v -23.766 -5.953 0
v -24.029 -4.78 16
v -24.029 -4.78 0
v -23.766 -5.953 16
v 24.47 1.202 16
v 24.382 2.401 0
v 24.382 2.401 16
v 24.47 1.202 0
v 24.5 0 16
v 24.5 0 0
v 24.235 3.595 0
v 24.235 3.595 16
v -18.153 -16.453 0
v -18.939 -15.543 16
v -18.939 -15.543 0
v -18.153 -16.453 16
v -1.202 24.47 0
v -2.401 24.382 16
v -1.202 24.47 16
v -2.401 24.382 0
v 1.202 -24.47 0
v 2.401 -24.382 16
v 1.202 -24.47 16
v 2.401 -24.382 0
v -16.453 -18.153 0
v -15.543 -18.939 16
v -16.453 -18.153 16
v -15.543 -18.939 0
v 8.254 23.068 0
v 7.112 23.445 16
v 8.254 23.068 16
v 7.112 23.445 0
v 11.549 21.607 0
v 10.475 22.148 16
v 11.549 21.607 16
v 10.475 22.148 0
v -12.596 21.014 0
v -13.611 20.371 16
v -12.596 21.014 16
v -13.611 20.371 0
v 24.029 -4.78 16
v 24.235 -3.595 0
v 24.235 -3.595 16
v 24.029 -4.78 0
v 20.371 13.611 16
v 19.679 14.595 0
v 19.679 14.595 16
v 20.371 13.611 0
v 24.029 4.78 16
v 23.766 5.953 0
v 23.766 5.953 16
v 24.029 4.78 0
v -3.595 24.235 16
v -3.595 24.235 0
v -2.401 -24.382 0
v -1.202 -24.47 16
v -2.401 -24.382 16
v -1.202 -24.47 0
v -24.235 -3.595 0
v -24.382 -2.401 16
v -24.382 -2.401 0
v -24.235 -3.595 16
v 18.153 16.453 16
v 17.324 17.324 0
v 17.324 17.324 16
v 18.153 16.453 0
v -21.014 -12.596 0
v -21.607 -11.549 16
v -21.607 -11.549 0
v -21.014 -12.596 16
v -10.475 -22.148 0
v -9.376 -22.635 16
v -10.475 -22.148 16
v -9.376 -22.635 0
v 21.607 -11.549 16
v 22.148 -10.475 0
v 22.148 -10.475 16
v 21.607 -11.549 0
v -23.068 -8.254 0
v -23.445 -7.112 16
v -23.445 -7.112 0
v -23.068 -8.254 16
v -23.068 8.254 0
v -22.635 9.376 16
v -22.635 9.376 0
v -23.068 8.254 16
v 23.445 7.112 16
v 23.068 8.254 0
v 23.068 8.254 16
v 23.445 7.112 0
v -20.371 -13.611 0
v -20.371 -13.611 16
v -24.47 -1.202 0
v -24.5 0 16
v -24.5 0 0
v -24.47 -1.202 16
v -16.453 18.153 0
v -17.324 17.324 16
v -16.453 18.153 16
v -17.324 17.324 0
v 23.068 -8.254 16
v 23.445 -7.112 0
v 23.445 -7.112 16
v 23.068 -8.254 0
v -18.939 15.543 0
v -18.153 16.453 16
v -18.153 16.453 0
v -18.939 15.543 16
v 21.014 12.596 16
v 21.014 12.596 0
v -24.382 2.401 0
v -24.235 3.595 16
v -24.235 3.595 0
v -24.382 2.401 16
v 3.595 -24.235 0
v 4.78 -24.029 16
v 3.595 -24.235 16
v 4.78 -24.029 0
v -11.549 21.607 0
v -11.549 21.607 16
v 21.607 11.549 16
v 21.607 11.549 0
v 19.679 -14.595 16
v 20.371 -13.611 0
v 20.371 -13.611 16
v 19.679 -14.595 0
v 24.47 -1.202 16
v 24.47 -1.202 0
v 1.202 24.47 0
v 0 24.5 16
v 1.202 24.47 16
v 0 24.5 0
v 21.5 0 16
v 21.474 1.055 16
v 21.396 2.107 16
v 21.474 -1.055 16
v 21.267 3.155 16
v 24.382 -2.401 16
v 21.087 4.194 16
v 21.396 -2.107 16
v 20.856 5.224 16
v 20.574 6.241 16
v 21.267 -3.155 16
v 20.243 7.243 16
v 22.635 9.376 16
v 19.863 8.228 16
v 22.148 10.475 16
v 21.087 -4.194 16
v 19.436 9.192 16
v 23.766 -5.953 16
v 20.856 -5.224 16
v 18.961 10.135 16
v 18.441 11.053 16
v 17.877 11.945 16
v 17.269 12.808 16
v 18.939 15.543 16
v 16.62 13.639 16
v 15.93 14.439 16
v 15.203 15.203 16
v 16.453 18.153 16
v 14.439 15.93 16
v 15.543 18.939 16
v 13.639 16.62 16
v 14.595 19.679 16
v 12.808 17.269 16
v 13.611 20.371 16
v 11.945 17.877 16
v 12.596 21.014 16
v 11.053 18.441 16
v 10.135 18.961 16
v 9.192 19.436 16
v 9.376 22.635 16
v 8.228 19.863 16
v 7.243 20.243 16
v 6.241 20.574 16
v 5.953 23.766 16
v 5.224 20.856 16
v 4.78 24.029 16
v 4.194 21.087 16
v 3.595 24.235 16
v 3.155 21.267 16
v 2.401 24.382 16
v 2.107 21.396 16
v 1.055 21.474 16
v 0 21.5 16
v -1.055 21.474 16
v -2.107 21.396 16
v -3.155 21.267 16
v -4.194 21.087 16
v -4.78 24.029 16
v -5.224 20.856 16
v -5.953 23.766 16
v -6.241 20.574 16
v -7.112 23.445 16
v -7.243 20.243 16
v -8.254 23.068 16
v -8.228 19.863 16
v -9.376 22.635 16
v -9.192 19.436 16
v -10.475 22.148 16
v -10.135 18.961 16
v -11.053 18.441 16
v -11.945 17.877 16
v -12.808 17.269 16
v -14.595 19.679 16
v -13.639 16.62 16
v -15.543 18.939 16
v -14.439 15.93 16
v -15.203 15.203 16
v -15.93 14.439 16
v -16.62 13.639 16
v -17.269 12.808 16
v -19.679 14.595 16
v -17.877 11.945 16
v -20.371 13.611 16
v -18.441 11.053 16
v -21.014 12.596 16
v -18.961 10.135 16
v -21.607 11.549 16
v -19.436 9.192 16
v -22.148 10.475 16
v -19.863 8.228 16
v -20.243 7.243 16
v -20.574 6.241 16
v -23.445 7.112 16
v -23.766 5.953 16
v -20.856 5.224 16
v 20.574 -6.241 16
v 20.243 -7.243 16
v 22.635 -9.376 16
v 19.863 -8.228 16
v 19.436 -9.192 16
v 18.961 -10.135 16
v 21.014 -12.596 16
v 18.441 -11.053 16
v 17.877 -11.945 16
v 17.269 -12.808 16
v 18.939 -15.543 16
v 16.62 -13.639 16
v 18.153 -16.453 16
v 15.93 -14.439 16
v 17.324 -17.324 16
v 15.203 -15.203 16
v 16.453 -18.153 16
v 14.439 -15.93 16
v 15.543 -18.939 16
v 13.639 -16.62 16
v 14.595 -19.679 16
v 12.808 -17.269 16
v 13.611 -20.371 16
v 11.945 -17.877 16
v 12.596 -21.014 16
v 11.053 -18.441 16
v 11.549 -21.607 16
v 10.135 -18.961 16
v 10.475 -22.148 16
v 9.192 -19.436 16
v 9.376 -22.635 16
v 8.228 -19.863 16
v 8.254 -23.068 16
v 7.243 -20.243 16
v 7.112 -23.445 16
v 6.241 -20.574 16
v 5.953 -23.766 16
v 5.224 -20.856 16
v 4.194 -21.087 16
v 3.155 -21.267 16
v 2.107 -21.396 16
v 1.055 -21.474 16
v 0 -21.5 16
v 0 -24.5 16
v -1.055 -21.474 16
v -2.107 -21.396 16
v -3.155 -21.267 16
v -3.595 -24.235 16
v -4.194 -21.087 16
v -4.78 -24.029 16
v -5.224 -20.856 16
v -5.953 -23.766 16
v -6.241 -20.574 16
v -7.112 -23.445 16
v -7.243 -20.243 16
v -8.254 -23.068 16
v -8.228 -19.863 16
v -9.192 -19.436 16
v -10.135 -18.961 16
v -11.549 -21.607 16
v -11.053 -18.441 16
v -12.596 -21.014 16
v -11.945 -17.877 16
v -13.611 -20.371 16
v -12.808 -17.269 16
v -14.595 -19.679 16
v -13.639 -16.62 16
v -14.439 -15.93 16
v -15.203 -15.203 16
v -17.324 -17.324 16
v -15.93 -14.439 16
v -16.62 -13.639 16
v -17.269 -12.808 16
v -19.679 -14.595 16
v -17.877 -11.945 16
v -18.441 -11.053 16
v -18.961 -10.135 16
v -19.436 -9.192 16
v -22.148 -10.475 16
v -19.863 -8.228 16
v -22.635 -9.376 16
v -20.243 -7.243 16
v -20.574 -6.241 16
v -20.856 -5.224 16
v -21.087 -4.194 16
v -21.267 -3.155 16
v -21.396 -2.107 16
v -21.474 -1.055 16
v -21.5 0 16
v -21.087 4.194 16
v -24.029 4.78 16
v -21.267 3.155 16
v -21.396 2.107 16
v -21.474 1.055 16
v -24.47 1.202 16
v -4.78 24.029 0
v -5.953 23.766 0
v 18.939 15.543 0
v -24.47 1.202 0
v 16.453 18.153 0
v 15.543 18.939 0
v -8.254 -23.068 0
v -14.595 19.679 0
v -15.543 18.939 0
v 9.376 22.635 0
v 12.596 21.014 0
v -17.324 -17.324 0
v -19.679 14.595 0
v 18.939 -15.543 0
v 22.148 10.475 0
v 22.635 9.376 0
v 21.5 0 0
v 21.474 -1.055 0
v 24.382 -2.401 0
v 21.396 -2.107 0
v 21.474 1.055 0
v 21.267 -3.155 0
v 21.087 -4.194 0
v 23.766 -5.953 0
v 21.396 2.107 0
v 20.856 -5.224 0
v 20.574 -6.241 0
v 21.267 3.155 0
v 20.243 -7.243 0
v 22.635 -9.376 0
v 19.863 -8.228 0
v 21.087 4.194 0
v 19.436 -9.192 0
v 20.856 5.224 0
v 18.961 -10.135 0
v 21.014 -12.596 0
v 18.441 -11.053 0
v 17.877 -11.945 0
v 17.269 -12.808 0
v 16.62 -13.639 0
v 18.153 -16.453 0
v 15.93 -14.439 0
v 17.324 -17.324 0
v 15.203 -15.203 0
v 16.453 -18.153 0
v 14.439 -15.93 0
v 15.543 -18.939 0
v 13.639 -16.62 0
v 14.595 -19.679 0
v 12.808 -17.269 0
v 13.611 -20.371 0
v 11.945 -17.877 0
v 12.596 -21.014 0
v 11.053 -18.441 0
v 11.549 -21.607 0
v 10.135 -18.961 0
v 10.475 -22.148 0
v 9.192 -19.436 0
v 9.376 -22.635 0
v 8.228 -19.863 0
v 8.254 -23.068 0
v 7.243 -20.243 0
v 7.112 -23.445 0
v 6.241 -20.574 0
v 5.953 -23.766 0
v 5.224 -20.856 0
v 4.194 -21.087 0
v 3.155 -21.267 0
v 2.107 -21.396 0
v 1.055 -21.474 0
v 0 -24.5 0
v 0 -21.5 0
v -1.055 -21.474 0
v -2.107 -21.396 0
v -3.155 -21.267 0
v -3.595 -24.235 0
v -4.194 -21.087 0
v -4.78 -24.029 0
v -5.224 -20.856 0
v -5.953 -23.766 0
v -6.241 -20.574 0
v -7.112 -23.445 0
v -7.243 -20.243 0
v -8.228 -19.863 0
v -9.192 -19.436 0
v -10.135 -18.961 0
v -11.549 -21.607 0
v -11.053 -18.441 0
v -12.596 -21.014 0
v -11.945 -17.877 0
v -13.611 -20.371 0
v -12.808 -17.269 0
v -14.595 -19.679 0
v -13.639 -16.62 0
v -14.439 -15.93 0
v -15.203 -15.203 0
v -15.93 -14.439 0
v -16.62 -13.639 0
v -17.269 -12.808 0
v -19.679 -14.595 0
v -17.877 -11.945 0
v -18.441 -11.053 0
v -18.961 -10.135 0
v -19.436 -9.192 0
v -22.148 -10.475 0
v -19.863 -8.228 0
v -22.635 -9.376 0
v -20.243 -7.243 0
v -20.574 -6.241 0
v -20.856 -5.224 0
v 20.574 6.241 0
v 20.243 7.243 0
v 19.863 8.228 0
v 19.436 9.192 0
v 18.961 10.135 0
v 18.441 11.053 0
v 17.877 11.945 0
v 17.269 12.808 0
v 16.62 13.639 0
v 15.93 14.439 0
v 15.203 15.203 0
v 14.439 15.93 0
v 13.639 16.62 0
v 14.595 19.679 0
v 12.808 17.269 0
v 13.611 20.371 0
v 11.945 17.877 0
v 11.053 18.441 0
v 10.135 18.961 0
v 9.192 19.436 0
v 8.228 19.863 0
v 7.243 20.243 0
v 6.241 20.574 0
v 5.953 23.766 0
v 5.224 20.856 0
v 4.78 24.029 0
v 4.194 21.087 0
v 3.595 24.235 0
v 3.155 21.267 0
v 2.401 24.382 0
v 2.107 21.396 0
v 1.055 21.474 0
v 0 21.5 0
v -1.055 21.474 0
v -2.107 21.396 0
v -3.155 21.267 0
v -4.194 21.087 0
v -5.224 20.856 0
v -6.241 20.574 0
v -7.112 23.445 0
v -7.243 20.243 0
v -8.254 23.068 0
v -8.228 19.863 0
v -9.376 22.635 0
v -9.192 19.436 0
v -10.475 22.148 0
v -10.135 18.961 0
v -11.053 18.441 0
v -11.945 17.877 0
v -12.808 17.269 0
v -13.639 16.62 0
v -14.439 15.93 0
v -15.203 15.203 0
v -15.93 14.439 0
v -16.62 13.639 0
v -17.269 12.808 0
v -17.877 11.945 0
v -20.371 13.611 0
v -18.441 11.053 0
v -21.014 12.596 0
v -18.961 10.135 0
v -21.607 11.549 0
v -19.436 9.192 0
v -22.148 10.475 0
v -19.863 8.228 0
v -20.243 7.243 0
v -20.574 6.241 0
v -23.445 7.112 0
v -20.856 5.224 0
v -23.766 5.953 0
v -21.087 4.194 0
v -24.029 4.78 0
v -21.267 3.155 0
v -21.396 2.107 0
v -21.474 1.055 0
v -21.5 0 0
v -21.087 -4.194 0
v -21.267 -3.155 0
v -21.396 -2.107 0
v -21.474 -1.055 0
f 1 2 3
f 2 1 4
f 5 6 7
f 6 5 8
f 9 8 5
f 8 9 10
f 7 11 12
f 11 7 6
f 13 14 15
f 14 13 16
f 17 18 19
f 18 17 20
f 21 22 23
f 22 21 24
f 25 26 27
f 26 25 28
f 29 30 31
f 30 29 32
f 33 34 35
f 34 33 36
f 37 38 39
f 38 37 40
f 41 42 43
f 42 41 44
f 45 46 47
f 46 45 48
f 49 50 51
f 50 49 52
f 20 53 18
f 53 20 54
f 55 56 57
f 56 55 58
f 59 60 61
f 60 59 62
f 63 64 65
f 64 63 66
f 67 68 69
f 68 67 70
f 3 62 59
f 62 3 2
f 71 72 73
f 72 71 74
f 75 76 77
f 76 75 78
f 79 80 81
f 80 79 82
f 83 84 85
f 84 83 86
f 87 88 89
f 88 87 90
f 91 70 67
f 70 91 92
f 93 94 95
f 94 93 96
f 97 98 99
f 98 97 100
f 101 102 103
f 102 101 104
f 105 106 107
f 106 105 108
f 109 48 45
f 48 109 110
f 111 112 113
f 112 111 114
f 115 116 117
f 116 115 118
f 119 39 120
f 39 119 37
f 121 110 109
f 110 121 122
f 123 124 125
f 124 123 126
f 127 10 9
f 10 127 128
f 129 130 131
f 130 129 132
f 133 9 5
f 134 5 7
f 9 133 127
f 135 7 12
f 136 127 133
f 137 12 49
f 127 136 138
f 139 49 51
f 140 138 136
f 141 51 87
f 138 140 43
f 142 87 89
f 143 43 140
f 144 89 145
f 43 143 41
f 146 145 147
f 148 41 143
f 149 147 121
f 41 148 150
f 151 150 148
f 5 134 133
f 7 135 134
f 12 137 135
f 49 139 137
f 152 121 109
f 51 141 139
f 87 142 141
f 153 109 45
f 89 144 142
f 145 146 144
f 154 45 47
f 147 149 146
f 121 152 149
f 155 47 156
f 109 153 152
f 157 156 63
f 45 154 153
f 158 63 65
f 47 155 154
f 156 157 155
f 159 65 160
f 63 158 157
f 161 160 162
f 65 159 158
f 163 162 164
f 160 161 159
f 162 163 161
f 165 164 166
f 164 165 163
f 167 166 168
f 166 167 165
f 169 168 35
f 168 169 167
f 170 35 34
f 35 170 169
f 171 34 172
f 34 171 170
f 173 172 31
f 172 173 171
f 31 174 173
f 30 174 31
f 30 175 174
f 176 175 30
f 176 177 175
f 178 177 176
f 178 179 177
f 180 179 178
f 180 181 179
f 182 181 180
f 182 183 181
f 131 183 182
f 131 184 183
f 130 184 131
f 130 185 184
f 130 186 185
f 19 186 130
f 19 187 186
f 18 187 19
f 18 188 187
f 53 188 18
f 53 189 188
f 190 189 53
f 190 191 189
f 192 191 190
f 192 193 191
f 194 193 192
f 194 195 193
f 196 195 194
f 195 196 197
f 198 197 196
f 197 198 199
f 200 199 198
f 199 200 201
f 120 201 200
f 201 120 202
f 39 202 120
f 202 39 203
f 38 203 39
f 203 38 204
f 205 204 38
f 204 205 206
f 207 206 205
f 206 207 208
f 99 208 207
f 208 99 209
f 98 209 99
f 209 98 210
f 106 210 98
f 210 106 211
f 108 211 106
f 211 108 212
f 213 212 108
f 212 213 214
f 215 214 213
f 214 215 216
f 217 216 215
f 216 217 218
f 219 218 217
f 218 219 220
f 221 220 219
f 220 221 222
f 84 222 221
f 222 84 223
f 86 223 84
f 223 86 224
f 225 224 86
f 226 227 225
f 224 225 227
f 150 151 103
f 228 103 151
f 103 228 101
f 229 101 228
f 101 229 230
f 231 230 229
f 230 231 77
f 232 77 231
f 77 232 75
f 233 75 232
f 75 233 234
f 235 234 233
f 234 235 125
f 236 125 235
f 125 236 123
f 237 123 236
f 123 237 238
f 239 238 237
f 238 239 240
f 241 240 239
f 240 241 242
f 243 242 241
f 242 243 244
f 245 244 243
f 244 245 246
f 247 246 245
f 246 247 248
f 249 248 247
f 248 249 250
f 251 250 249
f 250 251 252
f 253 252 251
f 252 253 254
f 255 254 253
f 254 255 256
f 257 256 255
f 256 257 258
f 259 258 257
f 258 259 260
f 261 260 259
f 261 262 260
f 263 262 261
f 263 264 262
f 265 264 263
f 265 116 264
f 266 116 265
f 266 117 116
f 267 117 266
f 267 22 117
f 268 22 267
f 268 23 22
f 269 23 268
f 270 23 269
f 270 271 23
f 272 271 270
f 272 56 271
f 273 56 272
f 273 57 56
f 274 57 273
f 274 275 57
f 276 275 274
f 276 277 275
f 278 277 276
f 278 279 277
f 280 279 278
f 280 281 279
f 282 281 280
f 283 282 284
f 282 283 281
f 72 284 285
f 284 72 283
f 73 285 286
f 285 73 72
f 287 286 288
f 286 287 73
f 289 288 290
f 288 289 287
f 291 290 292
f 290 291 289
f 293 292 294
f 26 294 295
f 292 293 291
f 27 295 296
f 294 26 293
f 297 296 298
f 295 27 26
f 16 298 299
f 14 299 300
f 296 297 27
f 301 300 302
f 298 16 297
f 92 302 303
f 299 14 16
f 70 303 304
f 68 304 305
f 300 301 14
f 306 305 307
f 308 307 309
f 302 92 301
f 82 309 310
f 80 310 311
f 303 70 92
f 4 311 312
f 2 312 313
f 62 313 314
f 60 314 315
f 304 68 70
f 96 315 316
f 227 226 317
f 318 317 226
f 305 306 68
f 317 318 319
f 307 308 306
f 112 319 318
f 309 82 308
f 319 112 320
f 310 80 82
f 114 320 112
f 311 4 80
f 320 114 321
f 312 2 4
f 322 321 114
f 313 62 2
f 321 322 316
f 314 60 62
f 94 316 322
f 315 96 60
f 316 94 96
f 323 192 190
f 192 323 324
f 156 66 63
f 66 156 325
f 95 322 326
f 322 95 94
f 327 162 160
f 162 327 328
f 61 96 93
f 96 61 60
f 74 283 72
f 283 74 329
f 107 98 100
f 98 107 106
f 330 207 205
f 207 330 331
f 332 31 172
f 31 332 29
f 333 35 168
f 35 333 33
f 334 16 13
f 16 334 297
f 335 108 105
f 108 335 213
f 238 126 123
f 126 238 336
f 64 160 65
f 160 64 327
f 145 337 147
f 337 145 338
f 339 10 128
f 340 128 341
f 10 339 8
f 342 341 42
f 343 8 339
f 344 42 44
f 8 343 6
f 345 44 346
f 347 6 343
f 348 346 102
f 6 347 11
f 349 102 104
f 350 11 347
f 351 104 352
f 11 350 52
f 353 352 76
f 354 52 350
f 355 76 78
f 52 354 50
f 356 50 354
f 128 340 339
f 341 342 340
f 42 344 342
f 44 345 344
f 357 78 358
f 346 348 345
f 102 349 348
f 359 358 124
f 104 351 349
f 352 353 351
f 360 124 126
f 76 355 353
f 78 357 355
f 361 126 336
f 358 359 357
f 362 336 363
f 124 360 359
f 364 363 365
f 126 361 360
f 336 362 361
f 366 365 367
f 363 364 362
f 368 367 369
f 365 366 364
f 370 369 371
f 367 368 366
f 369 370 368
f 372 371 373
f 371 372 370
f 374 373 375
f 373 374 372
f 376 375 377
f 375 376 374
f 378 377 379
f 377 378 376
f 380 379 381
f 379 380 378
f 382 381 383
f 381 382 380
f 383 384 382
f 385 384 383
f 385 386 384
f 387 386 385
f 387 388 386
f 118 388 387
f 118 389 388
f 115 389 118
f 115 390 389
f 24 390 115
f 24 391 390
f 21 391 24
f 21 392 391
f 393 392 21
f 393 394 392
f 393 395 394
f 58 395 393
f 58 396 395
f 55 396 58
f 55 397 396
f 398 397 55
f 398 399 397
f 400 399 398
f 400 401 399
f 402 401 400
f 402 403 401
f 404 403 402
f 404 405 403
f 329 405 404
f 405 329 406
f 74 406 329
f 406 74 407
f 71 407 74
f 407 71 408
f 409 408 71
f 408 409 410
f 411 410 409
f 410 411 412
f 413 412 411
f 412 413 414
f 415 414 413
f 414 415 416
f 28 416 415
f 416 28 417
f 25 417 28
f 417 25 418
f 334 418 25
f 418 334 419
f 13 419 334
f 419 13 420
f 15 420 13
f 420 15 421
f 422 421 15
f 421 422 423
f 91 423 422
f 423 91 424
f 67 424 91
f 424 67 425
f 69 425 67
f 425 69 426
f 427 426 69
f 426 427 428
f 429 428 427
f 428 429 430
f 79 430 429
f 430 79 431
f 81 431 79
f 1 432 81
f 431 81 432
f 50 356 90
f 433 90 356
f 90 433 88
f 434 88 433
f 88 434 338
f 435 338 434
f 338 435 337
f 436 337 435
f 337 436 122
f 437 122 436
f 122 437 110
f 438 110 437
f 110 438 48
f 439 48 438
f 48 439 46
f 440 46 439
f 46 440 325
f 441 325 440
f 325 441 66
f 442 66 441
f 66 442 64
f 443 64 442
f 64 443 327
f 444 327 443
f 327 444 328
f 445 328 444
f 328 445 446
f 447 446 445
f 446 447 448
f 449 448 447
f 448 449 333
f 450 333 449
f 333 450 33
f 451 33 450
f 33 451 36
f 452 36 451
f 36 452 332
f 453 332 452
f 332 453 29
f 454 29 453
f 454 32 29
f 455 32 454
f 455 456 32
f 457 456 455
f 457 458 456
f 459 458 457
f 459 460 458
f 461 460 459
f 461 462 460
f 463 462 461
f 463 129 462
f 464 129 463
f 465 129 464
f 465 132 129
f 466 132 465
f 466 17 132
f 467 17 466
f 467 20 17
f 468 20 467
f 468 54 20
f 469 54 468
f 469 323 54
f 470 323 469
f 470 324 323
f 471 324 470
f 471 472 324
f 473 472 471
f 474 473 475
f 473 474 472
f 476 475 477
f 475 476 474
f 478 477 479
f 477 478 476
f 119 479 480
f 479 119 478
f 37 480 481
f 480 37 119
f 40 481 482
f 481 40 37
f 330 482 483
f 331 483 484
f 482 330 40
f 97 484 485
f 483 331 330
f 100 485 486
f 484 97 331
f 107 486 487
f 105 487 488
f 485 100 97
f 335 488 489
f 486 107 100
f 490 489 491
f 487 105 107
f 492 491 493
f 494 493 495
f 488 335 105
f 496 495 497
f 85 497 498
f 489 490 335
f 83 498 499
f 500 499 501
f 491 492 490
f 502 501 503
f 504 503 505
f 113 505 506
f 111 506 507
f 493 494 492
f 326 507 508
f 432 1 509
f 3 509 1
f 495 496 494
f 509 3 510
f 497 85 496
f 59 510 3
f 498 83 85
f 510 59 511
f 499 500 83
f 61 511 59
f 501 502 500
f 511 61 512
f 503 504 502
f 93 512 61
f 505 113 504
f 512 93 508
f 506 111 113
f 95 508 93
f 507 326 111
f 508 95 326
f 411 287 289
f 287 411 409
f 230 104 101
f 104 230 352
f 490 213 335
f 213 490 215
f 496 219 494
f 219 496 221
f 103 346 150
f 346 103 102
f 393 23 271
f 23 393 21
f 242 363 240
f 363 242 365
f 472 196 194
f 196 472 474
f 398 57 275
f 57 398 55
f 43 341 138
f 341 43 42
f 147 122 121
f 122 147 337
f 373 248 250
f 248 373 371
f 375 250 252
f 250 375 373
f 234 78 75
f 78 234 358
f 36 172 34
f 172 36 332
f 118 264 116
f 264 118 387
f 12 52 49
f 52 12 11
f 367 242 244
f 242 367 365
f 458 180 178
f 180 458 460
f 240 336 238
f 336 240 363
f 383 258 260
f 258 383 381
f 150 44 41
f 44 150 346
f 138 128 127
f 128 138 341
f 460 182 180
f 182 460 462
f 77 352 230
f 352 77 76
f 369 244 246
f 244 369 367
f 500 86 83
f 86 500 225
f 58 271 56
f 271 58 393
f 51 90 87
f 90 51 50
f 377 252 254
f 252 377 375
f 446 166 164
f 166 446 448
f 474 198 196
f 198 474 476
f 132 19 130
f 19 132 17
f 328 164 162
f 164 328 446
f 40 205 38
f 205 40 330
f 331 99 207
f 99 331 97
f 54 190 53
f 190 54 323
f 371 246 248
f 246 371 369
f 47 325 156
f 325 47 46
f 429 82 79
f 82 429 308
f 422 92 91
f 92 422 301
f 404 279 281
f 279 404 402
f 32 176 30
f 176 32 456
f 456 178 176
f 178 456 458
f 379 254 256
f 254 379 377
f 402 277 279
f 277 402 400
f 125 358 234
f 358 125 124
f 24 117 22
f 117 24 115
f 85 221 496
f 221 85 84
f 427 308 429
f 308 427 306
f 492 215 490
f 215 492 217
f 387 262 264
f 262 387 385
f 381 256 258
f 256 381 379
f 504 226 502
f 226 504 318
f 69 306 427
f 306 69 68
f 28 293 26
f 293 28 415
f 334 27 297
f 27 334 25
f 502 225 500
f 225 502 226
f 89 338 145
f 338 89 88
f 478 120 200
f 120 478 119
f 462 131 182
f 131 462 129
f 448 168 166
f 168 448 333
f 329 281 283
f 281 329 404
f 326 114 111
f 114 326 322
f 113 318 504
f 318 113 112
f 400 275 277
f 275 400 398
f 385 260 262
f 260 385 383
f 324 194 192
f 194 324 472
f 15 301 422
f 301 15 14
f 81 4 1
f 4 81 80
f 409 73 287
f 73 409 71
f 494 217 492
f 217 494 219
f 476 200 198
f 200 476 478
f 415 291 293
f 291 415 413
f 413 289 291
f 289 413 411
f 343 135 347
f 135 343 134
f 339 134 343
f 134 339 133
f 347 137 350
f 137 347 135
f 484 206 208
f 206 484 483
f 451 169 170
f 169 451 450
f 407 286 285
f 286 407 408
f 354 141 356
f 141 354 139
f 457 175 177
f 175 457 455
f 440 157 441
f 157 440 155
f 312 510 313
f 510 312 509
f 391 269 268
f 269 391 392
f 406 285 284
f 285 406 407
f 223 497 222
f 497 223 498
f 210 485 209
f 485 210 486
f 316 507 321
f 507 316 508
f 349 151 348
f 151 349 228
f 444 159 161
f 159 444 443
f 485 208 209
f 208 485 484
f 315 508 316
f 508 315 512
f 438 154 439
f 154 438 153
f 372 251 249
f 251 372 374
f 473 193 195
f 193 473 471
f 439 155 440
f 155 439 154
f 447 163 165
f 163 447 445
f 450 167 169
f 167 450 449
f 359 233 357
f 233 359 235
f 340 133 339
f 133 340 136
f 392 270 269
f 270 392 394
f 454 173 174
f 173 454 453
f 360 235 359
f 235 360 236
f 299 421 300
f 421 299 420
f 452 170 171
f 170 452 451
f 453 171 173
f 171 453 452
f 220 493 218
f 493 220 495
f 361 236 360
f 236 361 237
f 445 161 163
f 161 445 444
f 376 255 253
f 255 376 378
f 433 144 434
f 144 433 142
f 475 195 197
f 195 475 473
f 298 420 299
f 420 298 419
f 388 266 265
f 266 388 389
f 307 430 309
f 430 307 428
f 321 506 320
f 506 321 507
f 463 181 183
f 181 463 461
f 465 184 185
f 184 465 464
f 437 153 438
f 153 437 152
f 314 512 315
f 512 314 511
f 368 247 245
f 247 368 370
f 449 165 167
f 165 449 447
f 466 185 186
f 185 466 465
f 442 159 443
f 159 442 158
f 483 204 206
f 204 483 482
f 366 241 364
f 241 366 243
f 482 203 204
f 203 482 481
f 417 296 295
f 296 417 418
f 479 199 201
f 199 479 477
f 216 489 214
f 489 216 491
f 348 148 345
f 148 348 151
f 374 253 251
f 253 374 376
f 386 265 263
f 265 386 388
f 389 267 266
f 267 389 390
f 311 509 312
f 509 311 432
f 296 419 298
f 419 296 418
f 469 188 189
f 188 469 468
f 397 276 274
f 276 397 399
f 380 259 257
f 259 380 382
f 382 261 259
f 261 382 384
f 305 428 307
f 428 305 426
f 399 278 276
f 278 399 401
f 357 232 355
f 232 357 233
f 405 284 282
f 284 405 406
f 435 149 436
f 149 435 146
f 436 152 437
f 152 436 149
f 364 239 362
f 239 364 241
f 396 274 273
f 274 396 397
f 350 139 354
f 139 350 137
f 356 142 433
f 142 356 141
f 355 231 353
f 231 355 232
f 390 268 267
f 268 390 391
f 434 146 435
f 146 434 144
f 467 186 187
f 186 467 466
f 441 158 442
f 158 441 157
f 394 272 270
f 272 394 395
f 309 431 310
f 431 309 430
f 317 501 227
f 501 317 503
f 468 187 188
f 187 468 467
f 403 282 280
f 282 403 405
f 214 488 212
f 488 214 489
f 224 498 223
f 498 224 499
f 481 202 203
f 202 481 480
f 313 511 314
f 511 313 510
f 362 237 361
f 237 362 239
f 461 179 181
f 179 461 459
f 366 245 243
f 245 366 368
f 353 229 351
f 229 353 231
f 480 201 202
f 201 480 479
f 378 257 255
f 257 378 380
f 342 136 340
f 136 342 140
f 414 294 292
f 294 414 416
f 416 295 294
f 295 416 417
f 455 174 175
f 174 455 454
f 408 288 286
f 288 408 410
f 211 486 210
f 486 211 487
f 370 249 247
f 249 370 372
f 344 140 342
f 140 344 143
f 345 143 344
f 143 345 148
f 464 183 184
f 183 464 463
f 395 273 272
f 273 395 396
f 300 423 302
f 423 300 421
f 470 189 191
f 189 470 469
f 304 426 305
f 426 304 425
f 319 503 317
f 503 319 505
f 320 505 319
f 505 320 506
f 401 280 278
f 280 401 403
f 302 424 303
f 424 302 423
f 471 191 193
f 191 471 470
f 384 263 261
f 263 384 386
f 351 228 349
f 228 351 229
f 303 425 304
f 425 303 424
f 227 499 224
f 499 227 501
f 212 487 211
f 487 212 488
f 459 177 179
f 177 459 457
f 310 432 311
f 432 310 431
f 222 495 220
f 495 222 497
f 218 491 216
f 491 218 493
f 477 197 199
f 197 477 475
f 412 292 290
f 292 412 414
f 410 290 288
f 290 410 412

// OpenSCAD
$fn = 128; // smoothness

pipe_radius = 21.5;

difference() {
  cylinder(r=pipe_radius + 3, h=16);

  cylinder(r=pipe_radius, h=100);
}
